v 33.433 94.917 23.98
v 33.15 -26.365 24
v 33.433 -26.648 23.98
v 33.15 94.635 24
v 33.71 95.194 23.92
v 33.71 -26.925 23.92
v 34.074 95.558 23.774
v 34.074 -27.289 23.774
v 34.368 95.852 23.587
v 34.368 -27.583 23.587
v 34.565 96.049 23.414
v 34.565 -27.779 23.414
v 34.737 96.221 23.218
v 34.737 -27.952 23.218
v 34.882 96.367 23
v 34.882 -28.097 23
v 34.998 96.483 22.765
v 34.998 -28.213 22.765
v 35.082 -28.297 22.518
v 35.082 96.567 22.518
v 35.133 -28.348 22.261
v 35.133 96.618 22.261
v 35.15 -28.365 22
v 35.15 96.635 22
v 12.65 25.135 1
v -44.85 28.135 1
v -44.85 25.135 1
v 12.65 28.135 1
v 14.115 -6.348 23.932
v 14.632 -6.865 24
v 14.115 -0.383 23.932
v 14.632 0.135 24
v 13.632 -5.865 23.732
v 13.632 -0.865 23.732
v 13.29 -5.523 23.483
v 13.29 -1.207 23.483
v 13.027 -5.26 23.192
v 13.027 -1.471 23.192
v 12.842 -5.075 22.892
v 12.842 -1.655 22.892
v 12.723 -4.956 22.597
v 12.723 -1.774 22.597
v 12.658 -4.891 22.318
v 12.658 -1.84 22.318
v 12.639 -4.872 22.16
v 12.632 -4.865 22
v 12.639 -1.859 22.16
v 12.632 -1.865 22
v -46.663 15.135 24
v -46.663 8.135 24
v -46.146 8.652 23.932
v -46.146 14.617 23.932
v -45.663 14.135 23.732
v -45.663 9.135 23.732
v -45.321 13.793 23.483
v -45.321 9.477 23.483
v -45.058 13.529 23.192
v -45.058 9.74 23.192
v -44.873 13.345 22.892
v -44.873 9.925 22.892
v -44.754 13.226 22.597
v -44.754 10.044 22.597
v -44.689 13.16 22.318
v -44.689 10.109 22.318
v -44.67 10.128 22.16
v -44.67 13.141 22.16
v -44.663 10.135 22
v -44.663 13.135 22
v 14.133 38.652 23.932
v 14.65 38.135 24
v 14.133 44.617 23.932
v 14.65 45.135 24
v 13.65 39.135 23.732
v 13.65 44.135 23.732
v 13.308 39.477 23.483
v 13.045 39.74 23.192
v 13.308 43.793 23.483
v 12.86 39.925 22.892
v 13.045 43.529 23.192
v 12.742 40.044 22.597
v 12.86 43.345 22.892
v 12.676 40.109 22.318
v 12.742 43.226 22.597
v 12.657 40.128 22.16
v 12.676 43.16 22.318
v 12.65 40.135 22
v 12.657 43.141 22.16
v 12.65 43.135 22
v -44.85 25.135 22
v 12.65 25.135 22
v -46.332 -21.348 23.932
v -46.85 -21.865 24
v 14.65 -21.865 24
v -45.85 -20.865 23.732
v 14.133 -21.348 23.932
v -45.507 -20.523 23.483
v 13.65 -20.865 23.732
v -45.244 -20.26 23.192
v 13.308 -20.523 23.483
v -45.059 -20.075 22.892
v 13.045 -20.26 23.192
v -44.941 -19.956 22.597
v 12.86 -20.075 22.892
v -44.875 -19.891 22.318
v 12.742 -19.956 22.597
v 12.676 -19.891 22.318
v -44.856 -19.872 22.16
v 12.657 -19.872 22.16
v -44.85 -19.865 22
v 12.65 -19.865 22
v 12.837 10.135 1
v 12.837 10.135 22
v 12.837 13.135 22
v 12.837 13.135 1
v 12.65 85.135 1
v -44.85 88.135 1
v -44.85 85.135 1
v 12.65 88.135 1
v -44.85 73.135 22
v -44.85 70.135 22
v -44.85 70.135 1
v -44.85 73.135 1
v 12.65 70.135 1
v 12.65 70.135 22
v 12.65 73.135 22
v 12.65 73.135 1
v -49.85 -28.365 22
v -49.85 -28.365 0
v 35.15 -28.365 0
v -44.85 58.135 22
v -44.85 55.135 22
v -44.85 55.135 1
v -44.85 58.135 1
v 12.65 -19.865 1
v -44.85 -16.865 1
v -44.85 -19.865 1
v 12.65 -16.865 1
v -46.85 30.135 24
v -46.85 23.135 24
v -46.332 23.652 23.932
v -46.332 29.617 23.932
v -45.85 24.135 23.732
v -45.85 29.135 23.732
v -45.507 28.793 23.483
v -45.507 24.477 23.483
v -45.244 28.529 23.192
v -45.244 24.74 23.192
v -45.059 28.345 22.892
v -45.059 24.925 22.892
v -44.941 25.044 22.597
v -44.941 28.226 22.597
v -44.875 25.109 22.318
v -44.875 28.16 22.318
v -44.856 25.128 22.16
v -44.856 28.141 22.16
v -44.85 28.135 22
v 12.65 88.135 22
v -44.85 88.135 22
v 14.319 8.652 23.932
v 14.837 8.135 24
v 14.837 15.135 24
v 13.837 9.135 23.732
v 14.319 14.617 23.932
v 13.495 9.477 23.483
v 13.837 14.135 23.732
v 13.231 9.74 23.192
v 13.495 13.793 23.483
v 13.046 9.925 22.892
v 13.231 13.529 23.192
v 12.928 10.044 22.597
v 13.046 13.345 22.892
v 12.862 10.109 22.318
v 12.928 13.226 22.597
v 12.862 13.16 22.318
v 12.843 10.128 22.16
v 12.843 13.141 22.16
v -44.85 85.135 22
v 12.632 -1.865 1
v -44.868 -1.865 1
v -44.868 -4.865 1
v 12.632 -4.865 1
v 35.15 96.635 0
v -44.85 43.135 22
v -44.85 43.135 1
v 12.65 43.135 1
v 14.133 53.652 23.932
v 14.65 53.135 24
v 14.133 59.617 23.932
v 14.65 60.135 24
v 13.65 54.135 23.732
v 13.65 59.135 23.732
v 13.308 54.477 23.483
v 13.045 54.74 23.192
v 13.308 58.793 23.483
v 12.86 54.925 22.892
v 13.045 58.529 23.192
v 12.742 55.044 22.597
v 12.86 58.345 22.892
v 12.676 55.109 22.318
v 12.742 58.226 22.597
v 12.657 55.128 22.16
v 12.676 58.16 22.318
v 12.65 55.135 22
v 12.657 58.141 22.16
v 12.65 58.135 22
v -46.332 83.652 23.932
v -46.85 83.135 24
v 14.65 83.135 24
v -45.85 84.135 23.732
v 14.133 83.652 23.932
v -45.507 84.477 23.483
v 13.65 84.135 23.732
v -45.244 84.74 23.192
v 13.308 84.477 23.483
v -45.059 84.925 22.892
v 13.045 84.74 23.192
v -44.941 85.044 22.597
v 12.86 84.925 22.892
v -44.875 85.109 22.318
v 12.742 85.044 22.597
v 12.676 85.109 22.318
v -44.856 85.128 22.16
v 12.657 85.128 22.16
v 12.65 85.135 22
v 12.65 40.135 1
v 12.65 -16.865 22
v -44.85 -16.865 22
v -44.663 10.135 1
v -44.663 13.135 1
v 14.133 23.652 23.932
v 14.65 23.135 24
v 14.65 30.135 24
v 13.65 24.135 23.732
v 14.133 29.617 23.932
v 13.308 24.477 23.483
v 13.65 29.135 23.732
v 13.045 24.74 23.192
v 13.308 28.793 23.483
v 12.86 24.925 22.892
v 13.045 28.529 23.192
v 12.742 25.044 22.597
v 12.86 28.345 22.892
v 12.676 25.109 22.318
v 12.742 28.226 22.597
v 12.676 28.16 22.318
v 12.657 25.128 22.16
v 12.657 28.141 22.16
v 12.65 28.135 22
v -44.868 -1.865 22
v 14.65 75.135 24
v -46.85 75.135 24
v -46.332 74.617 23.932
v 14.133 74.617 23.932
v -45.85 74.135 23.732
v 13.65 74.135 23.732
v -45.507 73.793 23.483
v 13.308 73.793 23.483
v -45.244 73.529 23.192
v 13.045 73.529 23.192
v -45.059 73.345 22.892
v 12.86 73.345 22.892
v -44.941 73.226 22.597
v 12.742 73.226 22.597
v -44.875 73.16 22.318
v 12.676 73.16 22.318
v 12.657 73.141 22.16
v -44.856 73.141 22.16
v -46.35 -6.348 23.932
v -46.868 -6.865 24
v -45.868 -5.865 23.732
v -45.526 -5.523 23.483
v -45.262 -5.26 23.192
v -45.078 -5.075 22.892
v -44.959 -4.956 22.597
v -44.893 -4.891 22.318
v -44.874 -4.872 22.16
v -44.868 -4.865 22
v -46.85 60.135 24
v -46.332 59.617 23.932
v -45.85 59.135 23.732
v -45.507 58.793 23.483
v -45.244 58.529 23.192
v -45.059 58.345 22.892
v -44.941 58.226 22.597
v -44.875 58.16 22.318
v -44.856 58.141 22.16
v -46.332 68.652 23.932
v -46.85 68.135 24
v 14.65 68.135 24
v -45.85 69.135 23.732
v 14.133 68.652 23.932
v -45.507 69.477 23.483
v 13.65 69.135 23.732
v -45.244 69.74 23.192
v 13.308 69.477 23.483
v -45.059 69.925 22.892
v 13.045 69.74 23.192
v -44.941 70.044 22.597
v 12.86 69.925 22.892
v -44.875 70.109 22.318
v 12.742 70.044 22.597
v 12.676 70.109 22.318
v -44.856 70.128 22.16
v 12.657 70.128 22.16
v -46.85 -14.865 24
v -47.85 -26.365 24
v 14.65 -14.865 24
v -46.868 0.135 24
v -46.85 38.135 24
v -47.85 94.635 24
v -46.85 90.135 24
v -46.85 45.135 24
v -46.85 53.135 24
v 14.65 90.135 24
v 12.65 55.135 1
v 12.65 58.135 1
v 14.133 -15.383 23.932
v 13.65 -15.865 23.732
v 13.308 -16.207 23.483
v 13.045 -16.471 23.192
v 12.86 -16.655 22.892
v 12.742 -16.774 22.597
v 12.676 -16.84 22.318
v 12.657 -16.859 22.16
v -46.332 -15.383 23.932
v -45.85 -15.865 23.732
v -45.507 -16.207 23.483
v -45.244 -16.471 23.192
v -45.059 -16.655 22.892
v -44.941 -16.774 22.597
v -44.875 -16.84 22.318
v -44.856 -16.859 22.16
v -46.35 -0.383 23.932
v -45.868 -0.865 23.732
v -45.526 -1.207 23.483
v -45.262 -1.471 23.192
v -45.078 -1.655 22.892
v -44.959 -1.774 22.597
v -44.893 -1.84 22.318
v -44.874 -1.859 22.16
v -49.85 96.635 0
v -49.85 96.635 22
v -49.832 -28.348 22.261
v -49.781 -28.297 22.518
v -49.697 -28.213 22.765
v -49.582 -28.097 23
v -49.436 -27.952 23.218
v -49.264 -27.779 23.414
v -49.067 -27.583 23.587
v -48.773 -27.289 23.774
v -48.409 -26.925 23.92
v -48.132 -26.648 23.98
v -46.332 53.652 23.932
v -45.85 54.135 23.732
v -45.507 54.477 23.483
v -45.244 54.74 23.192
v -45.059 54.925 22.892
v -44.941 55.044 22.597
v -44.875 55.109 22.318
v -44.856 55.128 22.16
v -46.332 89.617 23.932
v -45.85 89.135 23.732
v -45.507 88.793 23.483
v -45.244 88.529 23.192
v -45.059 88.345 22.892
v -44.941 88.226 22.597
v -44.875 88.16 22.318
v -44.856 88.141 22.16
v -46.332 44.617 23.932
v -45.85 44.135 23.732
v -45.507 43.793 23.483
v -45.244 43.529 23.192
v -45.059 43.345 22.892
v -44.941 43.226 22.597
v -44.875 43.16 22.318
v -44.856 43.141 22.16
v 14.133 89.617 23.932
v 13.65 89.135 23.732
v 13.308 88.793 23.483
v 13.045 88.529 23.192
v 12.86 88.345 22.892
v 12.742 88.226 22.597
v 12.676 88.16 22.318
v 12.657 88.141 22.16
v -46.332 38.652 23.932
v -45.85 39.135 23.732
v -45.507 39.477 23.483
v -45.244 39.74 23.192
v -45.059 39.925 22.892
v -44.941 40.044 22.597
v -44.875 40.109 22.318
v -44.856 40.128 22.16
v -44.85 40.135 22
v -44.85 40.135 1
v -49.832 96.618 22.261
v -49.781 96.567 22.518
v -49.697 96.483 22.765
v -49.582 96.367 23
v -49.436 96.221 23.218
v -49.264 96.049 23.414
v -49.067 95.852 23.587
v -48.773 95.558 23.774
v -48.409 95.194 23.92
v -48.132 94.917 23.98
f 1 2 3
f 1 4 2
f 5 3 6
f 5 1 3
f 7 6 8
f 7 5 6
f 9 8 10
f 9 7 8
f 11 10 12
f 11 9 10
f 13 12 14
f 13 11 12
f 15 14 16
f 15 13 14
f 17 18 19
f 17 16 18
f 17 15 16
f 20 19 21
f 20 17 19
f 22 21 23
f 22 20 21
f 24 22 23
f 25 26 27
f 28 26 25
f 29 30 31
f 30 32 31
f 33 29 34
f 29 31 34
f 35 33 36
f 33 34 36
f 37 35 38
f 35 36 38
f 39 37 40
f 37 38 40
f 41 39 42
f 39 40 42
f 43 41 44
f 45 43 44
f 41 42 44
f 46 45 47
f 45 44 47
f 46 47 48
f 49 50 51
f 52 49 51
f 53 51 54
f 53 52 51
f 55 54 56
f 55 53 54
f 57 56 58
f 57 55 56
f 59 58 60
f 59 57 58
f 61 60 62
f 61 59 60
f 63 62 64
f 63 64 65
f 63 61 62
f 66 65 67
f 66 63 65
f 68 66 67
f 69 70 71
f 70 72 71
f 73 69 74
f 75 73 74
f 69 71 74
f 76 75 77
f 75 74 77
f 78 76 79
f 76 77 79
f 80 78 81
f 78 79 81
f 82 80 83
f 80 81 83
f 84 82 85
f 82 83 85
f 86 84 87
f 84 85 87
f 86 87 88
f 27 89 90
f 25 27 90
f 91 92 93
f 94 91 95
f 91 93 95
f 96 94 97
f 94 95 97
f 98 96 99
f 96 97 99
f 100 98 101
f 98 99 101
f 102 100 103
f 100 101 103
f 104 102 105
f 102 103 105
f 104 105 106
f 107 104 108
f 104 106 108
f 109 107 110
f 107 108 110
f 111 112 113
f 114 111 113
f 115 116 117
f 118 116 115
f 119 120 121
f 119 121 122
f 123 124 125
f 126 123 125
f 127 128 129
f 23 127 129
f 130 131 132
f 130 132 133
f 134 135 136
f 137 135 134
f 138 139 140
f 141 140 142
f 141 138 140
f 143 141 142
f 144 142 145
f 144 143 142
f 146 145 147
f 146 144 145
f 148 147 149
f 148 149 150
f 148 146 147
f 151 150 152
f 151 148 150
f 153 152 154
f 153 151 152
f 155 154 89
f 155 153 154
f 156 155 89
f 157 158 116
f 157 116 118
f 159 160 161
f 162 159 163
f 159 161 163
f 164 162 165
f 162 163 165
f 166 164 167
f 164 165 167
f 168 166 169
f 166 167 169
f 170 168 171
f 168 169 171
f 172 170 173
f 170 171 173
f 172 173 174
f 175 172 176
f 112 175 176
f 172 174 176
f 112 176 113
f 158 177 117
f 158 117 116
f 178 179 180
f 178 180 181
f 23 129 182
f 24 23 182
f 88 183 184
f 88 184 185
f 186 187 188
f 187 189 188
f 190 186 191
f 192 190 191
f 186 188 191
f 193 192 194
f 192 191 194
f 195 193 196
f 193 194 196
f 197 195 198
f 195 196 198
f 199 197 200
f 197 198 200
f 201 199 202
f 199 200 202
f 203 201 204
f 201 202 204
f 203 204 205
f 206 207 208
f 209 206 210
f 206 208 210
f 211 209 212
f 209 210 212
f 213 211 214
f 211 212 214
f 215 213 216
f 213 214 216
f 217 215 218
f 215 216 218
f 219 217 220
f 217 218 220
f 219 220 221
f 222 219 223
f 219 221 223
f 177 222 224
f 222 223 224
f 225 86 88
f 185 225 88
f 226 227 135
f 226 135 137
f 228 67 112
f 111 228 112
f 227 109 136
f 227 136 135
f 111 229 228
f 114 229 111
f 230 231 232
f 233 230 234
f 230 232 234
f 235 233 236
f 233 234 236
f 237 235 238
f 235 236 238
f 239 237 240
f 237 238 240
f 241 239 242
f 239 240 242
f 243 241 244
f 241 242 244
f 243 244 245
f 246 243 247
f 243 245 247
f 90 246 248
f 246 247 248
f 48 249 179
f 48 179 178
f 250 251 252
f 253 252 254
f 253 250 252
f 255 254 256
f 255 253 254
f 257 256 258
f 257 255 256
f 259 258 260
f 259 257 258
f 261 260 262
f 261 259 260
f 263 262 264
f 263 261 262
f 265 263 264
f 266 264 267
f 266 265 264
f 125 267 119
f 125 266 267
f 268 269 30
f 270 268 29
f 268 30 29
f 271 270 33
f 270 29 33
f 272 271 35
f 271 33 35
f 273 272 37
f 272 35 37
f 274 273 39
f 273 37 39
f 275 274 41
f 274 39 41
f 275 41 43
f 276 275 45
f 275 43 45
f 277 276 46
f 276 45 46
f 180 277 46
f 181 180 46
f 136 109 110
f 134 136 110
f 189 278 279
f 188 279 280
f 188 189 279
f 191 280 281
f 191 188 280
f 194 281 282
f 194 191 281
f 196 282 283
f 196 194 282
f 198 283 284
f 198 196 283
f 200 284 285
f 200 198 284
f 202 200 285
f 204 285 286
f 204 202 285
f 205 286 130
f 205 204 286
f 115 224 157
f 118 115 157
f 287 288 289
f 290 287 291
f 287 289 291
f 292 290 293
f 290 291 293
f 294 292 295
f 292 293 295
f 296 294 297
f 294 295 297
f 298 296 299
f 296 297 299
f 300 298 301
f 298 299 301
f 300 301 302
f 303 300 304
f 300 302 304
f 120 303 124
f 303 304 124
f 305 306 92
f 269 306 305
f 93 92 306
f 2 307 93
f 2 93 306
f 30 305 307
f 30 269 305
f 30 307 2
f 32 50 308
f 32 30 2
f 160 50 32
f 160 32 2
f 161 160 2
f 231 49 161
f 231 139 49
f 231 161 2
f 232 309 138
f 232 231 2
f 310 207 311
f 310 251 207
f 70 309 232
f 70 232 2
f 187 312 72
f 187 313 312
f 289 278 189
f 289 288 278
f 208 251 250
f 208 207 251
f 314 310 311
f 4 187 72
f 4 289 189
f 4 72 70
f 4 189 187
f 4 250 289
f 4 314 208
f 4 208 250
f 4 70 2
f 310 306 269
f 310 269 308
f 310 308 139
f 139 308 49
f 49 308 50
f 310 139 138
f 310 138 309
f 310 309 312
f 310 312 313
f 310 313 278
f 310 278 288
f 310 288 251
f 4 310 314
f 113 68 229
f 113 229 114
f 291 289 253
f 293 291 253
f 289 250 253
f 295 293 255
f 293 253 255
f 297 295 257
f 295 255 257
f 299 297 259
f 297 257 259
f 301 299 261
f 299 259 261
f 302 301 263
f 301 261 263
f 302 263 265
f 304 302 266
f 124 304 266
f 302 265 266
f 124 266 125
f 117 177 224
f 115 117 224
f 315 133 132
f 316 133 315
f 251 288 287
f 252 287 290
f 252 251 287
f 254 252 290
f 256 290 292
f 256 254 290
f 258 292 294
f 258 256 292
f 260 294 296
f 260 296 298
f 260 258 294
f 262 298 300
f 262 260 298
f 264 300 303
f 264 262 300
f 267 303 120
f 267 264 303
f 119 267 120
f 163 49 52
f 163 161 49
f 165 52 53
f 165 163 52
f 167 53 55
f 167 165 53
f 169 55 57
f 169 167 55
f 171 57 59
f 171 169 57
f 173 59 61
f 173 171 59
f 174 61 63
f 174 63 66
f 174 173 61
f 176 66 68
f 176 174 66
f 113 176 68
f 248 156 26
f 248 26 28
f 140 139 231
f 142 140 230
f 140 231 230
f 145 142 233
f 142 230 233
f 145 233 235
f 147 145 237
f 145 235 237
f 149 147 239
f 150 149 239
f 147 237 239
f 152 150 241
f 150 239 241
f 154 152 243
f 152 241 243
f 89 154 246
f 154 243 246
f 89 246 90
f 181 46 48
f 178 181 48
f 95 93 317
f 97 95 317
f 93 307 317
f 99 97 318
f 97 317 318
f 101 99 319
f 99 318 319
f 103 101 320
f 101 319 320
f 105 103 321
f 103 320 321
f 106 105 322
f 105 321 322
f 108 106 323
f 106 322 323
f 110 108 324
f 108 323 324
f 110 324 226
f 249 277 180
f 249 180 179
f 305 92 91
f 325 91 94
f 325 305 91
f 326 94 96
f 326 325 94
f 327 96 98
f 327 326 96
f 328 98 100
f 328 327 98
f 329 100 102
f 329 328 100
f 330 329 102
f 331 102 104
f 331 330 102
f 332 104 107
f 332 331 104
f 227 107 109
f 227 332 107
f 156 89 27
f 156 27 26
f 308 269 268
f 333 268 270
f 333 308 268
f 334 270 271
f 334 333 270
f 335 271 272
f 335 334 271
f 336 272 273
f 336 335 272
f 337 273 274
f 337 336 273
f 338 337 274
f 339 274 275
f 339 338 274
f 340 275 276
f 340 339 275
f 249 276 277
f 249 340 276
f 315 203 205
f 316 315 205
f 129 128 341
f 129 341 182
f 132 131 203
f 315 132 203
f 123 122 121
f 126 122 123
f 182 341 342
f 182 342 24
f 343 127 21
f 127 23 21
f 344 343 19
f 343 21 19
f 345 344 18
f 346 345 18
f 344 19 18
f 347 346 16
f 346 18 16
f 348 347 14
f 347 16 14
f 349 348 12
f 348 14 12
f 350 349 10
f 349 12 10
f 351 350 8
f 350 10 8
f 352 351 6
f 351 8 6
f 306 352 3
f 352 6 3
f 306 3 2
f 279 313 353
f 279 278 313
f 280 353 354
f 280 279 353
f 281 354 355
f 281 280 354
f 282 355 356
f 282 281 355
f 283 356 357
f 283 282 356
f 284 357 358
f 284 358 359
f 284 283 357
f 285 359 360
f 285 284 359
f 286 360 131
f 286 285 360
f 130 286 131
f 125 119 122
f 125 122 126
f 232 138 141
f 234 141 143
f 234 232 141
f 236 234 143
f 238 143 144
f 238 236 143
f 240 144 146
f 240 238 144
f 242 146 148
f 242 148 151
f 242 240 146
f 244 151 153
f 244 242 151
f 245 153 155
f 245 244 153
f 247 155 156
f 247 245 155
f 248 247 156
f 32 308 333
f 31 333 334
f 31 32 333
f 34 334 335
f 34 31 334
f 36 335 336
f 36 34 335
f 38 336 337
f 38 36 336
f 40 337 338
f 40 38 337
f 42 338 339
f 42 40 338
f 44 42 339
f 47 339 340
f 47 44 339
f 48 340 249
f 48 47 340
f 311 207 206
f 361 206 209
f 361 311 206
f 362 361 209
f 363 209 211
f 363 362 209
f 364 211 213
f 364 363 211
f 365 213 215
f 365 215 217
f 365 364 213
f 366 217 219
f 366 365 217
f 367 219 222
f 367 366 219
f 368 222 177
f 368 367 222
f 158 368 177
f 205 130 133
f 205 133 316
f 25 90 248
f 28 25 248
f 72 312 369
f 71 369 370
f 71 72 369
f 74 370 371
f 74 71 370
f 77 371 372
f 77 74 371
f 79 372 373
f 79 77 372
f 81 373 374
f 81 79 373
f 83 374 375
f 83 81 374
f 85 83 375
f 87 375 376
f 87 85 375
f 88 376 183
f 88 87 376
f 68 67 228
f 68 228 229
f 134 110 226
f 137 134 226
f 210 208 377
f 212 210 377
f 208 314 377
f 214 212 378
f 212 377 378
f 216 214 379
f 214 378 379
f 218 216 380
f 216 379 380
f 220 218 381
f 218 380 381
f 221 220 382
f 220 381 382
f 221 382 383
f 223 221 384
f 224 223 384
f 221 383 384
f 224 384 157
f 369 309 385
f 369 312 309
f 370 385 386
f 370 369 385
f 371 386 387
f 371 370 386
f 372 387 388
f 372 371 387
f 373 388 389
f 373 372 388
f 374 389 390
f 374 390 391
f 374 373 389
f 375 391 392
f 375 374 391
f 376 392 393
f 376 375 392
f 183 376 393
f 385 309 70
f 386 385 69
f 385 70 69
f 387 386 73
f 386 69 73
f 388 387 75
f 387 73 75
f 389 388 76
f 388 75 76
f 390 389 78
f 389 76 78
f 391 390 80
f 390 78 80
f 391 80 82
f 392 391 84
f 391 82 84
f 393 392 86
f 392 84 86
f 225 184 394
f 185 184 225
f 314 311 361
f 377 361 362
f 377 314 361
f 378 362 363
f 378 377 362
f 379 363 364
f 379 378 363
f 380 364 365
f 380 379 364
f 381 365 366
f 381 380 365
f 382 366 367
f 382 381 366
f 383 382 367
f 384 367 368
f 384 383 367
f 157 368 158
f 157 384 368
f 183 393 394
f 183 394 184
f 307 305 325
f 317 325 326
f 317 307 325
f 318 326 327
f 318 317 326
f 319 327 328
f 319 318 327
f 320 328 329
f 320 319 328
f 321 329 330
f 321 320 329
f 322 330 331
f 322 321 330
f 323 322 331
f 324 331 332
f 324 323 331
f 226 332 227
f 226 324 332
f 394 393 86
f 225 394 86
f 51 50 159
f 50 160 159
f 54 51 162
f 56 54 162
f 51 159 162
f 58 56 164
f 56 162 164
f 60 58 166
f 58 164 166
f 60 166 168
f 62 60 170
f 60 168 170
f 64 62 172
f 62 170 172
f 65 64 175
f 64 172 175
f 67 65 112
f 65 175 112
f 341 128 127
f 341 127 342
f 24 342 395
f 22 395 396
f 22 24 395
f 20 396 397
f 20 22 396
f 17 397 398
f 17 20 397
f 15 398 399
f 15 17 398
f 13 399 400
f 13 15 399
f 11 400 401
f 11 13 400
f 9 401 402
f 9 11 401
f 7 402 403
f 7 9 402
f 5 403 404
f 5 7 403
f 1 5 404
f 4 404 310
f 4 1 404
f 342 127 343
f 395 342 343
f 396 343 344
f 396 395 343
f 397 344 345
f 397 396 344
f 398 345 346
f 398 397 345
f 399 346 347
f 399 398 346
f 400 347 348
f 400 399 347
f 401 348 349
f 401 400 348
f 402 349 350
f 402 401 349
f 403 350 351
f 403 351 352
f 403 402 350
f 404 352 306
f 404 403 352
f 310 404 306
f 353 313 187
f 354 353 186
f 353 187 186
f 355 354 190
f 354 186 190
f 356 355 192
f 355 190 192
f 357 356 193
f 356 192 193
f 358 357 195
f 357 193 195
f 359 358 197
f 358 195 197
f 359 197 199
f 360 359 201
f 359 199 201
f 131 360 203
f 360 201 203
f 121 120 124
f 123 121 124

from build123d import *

# Parameters (mm, degrees)
F0_W     = 85
F0_H     = 125
F1_DEPTH = 24
F2_W     = 57.5
F2_H     = 3
F3_DEPTH = 23
F4_R     = 2


# Not quite as in the source:
# - a feature names something its author has since deleted; it is built from what else it names


with BuildPart() as f1:
    # F0 (on Top) → F1 (new body)
    with BuildSketch(Plane.XY):
        with Locations((-7.3496025801, 34.134781265)):
            Rectangle(F0_W, F0_H)
    extrude(amount=F1_DEPTH)

    # F2 (on face) → F3 (cut)
    with BuildSketch(Plane.XY.offset(24)):
        with Locations((-16.0996025801, -18.365218735)):
            Rectangle(F2_W, F2_H)
        with Locations((-16.11783728, -3.365218735)):
            Rectangle(F2_W, F2_H)
        with Locations((-15.9132478945, 11.634781265)):
            Rectangle(F2_W, F2_H)
        with Locations((-16.0996025801, 26.634781265)):
            Rectangle(F2_W, F2_H)
        with Locations((-16.0996025801, 41.634781265)):
            Rectangle(F2_W, F2_H)
        with Locations((-16.0996025801, 56.634781265)):
            Rectangle(F2_W, F2_H)
        with Locations((-16.0996025801, 71.634781265)):
            Rectangle(F2_W, F2_H)
        with Locations((-16.0996025801, 86.634781265)):
            Rectangle(F2_W, F2_H)
    extrude(amount=-F3_DEPTH, mode=Mode.SUBTRACT)

    # F4
    f4_edges = [f1.edges().sort_by_distance(p)[0] for p in [
        (-16.099603, -19.865219, 24),
        (-16.099603, -16.865219, 24),
        (12.650397, -18.365219, 24),
        (-44.849603, -18.365219, 24),
        (-16.117837, -1.865219, 24),
        (-16.117837, -4.865219, 24),
        (-44.867837, -3.365219, 24),
        (12.632163, -3.365219, 24),
        (-49.849603, 34.134781, 24),
        (-7.349603, 96.634781, 24),
        (-7.349603, -28.365219, 24),
        (35.150397, 34.134781, 24),
        (12.650397, 26.634781, 24),
        (-16.099603, 28.134781, 24),
        (-44.849603, 26.634781, 24),
        (-16.099603, 25.134781, 24),
        (12.836752, 11.634781, 24),
        (-15.913248, 13.134781, 24),
        (-44.663248, 11.634781, 24),
        (-15.913248, 10.134781, 24),
        (-16.099603, 43.134781, 24),
        (-44.849603, 41.634781, 24),
        (-16.099603, 40.134781, 24),
        (12.650397, 41.634781, 24),
        (-16.099603, 58.134781, 24),
        (-44.849603, 56.634781, 24),
        (-16.099603, 55.134781, 24),
        (12.650397, 56.634781, 24),
        (-16.099603, 73.134781, 24),
        (-44.849603, 71.634781, 24),
        (-16.099603, 70.134781, 24),
        (12.650397, 71.634781, 24),
        (-16.099603, 88.134781, 24),
        (-44.849603, 86.634781, 24),
        (-16.099603, 85.134781, 24),
        (12.650397, 86.634781, 24),
    ]]
    fillet(f4_edges, radius=F4_R)


solid = f1.part
